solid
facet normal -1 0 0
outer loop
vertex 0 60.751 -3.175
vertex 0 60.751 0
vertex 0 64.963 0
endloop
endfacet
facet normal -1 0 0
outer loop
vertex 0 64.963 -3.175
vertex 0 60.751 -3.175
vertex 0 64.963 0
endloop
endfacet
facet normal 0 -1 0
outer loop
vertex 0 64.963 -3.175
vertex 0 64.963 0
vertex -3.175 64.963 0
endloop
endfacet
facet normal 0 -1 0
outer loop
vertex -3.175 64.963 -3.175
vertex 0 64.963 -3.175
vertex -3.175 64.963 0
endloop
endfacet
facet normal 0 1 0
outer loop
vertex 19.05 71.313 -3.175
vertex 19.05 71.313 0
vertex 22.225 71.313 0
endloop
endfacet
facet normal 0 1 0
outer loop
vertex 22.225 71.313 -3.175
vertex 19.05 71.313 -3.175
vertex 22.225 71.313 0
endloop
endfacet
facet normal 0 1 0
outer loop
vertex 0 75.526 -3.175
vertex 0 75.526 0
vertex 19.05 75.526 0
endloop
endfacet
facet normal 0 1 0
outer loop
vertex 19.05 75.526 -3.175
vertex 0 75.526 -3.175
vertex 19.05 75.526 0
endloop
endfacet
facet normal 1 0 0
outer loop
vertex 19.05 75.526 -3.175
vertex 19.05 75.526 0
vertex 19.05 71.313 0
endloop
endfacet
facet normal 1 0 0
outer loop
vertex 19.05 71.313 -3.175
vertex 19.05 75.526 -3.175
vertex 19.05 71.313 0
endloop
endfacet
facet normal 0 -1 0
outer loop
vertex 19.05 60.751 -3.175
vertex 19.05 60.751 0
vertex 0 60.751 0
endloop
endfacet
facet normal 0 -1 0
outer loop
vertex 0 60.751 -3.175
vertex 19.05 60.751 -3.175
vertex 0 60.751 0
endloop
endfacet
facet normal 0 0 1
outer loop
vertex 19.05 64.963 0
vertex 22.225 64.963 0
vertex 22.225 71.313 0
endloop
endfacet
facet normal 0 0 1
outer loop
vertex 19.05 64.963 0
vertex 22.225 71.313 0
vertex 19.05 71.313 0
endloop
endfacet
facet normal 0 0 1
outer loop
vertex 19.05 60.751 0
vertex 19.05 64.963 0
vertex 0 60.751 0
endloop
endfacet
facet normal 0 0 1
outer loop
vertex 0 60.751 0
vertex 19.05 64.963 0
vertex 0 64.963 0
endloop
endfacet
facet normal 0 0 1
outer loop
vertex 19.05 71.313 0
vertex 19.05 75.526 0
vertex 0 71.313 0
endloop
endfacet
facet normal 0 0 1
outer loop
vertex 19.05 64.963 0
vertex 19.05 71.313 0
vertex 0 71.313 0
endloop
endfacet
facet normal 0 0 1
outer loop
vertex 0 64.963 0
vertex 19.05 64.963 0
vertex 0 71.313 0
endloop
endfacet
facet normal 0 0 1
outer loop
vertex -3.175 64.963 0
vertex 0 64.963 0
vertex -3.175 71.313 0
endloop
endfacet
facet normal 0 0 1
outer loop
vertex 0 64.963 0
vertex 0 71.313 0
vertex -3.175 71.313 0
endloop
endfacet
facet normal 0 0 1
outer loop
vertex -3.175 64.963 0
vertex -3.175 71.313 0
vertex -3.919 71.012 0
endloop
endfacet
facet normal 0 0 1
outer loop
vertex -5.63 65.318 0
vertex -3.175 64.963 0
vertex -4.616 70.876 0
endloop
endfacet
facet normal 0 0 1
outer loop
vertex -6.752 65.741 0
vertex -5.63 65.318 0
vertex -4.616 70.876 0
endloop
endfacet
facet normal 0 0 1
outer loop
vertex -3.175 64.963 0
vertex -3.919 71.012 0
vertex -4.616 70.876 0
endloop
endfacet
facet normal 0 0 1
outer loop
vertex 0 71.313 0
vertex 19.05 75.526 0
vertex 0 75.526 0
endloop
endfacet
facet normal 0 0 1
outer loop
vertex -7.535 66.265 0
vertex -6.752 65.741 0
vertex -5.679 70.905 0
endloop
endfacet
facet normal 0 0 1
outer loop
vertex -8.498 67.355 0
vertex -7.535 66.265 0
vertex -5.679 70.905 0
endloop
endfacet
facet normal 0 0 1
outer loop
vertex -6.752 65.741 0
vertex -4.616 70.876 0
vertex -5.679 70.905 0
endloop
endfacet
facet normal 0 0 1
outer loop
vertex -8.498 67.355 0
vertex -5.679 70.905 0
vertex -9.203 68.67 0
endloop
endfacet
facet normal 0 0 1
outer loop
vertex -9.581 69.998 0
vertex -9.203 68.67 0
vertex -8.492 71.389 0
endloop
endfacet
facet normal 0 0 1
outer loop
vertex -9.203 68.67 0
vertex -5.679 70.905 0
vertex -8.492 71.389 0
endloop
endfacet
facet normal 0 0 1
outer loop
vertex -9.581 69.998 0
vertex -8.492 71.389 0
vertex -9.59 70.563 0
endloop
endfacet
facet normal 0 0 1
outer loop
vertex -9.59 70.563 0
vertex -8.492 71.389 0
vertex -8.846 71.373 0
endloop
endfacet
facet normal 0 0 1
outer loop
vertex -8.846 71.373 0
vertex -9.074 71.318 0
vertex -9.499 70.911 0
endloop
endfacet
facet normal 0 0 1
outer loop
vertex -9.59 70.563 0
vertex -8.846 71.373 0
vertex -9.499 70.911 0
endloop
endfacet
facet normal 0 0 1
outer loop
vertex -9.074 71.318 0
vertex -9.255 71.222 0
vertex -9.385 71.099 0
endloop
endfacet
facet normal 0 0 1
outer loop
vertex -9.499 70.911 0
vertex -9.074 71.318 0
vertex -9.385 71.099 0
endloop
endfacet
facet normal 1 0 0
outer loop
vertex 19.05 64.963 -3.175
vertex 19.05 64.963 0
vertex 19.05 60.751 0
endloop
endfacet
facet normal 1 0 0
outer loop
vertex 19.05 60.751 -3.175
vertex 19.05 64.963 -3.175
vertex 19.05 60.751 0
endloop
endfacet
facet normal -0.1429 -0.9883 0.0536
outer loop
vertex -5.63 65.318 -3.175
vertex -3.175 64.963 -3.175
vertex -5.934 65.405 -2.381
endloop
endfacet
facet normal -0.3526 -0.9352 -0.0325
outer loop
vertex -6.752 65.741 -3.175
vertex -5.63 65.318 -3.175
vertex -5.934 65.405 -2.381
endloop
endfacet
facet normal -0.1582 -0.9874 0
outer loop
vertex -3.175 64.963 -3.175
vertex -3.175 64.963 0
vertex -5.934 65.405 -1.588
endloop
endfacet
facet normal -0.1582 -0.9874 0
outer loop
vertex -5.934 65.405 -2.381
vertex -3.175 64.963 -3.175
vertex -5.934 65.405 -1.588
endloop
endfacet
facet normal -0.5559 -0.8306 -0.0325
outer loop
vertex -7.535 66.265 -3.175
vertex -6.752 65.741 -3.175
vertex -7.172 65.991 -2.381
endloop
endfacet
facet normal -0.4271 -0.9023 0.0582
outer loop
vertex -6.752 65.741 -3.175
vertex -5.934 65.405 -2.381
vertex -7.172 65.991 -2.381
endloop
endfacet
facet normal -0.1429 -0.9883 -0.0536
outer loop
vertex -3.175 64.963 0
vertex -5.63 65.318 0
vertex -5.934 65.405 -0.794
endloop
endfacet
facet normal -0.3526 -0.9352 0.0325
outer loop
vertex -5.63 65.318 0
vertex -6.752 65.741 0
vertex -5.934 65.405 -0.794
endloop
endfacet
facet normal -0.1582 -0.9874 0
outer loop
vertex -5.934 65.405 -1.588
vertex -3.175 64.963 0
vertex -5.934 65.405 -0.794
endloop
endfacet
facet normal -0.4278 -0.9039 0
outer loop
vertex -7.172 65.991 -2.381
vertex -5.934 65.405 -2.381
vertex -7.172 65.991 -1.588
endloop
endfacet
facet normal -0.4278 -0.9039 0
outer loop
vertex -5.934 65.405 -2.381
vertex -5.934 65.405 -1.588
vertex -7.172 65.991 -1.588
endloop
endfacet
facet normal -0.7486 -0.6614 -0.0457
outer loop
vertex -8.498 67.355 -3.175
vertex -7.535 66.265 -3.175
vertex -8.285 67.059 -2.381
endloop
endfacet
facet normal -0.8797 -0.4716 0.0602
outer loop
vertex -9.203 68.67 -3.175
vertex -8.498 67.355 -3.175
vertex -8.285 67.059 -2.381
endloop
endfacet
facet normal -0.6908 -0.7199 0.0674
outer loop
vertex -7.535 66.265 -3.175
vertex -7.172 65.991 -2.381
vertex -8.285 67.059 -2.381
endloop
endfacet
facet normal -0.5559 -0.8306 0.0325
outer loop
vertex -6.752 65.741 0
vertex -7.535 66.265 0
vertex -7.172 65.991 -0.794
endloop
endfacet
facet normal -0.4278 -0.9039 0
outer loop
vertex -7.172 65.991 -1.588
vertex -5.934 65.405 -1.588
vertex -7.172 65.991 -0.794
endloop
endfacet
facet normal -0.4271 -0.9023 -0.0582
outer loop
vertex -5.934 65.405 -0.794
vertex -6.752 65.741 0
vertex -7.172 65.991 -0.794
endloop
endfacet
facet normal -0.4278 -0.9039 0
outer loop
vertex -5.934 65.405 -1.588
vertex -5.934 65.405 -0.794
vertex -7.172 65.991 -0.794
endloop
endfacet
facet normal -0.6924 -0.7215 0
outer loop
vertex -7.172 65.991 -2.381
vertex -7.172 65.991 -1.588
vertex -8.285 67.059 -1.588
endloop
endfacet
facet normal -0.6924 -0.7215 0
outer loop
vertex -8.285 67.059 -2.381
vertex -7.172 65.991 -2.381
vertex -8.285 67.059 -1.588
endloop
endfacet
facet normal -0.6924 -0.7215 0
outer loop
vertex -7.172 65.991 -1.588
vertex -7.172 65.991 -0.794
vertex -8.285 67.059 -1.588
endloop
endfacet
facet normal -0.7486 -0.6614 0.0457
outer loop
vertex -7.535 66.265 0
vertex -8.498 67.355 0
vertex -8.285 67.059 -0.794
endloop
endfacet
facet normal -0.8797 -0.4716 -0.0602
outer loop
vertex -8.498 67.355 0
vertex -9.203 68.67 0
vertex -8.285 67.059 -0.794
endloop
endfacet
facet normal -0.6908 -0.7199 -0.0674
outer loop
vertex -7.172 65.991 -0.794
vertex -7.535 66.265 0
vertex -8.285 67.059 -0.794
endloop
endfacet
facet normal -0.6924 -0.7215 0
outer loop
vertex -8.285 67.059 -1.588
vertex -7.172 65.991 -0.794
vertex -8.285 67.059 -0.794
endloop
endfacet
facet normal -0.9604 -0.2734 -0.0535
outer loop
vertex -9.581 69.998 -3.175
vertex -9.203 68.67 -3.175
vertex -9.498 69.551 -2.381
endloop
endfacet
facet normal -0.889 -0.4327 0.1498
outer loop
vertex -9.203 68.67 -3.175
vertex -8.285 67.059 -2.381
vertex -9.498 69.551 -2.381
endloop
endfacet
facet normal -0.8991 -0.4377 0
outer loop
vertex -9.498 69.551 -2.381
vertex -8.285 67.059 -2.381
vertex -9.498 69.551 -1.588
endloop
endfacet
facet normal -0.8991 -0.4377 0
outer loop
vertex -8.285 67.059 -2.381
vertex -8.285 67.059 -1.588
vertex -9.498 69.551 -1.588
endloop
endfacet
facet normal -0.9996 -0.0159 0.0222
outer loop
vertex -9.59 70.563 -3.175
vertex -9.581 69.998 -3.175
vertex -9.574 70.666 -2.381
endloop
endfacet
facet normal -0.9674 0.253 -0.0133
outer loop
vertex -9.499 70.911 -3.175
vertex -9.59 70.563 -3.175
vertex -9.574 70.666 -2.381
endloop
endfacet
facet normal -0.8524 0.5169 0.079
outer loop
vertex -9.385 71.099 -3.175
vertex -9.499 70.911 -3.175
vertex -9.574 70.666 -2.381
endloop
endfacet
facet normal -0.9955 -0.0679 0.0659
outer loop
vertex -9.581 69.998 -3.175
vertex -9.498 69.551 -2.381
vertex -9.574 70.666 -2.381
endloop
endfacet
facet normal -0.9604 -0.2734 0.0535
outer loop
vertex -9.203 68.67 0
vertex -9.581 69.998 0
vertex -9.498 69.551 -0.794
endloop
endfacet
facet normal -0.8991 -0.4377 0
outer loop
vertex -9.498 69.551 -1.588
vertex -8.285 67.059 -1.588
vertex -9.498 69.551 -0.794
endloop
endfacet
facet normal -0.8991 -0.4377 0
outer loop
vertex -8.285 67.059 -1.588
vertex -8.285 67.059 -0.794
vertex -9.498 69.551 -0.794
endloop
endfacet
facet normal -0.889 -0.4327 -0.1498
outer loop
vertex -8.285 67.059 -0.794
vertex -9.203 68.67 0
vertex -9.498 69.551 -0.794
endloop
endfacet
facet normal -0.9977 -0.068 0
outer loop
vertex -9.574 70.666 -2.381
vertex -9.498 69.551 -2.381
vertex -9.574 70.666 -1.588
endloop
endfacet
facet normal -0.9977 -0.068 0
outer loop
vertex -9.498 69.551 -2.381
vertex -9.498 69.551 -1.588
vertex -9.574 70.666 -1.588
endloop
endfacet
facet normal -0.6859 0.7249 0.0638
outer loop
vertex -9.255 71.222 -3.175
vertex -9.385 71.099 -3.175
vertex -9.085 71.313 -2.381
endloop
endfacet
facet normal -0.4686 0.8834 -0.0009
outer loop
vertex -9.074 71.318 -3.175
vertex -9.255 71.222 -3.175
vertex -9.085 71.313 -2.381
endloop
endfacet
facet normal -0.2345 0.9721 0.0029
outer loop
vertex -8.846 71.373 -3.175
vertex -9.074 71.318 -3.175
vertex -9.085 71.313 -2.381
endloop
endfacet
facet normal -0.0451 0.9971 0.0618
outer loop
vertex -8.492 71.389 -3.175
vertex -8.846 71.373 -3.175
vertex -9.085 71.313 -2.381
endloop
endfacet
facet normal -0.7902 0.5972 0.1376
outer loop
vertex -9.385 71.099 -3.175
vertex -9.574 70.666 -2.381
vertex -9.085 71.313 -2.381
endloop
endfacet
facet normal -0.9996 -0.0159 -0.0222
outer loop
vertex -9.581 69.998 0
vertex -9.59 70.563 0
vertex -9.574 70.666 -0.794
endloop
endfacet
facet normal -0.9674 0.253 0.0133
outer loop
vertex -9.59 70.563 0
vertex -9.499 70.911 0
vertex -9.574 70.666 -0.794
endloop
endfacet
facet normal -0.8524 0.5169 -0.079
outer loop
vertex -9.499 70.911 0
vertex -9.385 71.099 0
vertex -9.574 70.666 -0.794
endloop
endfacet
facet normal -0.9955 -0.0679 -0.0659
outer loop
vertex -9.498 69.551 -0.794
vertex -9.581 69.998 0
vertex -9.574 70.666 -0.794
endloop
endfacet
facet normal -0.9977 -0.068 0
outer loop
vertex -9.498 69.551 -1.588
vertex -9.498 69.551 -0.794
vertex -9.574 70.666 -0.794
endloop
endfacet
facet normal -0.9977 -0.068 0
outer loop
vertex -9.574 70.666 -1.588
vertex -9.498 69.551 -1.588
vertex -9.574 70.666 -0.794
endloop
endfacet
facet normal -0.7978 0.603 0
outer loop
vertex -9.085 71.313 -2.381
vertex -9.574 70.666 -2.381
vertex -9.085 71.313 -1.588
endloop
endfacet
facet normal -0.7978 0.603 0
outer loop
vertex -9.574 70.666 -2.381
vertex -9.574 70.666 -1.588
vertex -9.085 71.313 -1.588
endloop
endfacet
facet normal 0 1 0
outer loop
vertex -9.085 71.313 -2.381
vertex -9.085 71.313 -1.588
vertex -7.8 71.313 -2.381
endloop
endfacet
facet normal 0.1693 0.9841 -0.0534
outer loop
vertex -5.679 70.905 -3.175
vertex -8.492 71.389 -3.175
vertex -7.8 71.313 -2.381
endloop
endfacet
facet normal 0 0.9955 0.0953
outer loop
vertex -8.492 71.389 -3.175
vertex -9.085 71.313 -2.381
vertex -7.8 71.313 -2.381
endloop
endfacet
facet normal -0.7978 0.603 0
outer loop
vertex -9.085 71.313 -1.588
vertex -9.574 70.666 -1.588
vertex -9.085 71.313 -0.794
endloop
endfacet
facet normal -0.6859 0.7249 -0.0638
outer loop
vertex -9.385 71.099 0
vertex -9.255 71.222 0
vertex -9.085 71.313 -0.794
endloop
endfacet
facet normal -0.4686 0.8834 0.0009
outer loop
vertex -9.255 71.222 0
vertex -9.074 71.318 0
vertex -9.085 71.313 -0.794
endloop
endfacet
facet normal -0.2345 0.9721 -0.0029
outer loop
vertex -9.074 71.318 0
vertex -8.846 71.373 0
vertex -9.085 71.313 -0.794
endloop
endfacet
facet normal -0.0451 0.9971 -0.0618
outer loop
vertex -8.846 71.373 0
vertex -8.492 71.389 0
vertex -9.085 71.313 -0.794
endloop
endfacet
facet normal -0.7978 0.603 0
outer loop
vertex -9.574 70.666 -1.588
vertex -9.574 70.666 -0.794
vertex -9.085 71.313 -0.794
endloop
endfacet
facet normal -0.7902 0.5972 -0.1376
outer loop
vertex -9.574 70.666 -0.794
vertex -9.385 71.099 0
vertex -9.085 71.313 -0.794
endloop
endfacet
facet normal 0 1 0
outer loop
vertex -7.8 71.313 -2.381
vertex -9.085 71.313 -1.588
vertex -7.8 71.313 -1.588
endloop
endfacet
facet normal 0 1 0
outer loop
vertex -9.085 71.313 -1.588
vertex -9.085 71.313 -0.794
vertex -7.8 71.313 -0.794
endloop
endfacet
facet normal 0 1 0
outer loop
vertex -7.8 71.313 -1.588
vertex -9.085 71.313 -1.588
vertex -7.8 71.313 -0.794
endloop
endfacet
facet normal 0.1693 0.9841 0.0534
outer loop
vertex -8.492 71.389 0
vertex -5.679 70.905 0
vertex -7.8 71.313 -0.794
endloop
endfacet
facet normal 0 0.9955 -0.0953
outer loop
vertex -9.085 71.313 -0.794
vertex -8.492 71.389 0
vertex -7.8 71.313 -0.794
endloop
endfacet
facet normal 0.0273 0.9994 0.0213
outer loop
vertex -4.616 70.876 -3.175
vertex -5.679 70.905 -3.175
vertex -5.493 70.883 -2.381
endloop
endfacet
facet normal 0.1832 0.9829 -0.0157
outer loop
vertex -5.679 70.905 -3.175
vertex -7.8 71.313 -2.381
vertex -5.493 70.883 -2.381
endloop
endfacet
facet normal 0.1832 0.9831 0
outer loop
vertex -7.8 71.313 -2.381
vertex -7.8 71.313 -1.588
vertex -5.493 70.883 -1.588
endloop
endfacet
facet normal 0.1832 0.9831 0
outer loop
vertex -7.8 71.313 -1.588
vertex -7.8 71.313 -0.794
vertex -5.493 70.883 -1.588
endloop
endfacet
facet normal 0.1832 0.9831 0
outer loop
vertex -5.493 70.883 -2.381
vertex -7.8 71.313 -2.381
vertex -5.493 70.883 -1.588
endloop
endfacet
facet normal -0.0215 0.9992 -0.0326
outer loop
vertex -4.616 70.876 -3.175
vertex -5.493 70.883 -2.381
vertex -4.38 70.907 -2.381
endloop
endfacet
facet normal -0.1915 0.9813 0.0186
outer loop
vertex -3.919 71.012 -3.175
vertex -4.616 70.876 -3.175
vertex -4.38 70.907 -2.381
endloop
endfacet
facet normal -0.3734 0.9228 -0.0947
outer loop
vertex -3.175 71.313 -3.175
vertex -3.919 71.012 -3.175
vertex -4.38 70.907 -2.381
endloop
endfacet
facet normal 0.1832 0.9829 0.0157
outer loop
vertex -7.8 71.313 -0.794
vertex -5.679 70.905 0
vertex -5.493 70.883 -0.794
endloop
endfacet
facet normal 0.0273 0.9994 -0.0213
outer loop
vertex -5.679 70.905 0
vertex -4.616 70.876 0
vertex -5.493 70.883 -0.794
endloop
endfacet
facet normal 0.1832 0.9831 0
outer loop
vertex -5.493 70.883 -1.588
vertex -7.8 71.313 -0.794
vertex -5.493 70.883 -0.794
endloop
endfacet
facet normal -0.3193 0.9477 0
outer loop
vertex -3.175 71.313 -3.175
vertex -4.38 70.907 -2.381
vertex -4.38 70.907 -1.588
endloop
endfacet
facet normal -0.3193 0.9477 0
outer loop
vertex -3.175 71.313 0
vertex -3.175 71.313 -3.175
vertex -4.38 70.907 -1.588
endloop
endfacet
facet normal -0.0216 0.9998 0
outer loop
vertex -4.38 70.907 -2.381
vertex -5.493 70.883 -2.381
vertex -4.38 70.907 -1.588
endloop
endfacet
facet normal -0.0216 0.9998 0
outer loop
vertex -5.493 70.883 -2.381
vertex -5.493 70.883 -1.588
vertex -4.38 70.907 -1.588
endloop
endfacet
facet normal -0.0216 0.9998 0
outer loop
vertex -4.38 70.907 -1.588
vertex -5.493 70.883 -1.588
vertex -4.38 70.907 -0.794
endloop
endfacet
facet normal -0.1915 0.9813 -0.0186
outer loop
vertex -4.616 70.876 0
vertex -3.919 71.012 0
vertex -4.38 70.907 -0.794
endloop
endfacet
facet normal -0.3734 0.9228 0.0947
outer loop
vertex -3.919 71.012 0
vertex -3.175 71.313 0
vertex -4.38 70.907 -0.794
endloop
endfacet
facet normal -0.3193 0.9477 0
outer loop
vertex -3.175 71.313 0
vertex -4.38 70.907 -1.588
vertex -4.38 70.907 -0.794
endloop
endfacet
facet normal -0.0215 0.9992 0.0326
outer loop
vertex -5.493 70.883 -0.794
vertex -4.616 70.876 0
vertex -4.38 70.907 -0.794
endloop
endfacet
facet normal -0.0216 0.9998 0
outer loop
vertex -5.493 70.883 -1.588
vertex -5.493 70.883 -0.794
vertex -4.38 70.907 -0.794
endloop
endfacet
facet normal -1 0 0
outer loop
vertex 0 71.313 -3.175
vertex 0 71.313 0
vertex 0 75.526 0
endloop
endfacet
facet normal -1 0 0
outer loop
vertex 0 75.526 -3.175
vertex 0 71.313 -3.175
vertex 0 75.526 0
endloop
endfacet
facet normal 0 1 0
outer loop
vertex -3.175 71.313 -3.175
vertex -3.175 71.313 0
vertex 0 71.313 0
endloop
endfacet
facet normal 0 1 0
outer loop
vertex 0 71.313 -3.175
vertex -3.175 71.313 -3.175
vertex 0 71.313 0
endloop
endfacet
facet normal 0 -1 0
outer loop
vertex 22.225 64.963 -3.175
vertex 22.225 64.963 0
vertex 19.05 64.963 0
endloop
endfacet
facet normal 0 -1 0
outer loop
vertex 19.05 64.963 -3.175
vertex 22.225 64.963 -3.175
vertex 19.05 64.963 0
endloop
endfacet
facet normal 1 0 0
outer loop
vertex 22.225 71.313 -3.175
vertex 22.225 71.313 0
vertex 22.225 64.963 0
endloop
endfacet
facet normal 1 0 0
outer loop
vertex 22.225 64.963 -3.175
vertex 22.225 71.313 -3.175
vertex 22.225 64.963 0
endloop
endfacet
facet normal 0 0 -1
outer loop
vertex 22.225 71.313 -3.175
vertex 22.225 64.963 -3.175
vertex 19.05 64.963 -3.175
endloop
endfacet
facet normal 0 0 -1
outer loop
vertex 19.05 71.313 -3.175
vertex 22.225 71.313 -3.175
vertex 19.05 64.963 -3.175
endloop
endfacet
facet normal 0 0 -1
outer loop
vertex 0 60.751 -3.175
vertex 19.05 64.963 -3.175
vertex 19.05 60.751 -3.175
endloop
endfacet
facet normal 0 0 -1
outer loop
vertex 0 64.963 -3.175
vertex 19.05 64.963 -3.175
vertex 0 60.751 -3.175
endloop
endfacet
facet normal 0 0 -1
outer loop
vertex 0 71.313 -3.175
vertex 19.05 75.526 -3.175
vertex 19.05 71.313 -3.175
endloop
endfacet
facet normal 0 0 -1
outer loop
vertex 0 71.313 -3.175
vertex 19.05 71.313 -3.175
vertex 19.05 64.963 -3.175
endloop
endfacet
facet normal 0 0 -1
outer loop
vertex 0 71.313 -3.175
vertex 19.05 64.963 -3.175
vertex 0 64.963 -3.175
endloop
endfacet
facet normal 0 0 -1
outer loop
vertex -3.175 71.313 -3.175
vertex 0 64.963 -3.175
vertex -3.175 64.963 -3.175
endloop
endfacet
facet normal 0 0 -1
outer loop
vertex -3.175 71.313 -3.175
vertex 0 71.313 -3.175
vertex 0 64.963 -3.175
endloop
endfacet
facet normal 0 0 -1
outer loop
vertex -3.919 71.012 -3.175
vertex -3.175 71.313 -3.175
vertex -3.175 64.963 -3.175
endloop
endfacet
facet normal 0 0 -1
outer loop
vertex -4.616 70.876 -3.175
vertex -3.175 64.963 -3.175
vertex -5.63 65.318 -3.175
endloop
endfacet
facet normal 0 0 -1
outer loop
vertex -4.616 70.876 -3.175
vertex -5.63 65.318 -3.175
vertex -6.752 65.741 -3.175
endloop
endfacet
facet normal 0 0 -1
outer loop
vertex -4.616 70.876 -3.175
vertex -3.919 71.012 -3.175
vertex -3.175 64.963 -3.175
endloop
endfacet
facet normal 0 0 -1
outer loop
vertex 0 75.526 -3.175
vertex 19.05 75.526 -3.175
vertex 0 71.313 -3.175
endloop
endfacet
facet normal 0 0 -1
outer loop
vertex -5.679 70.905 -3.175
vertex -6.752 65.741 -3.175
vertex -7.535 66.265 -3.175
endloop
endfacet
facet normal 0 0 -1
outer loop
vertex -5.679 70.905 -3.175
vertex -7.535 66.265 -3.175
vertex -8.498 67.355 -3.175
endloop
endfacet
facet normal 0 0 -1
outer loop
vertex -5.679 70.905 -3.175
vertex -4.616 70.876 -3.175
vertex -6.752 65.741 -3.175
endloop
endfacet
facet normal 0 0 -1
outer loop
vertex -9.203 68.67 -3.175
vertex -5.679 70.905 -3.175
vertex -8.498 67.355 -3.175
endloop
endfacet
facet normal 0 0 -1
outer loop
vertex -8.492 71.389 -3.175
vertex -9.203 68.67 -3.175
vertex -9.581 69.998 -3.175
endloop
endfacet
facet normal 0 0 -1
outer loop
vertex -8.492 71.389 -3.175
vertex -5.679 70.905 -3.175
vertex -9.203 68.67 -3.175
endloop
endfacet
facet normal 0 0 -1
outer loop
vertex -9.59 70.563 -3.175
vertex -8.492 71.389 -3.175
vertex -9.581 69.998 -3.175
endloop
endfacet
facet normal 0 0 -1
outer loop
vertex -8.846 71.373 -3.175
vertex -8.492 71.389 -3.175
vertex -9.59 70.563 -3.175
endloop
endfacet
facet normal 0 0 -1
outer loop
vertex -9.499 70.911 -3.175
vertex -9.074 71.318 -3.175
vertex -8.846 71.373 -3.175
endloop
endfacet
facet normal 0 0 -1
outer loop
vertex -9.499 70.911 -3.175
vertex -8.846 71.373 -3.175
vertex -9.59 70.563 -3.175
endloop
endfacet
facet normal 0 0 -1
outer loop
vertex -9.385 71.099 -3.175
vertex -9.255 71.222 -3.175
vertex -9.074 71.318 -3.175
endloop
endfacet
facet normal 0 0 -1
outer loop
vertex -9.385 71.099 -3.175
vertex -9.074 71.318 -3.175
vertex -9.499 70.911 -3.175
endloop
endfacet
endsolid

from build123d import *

# Parameters (mm, degrees)
BOSS_EXTRUDE1_DEPTH = 3.175


with BuildPart() as part:
    # Sketch1 → Boss-Extrude1 (new body)
    with BuildSketch(Plane.XY):
        with BuildLine():
            Line((0, 75.526182311), (19.05, 75.526182311))
            Line((19.05, 75.526182311), (19.05, 71.313421555))
            Line((19.05, 71.313421555), (22.225, 71.313421555))
            Line((22.225, 71.313421555), (22.225, 64.963421555))
            Line((22.225, 64.963421555), (19.05, 64.963421555))
            Line((19.05, 64.963421555), (19.05, 60.750660799))
            Line((19.05, 60.750660799), (0, 60.750660799))
            Line((0, 60.750660799), (0, 64.963421555))
            Line((0, 64.963421555), (-3.175, 64.963421555))
            add(Edge.make_bspline(
                [(-3.175, 64.963421555), (-5.108636106, 65.168250885), (-8.266780599, 65.288799196), (-10.432089719, 71.610856743), (-6.445221982, 71.202217844), (-4.881107751, 70.440619428), (-3.175, 71.313421555)],
                knots=[0, 0, 0, 0, 0.353492234, 0.624794573, 0.705320645, 1, 1, 1, 1], degree=3))
            Line((-3.175, 71.313421555), (0, 71.313421555))
            Line((0, 71.313421555), (0, 75.526182311))
        make_face()
    extrude(amount=-BOSS_EXTRUDE1_DEPTH)


solid = part.part
